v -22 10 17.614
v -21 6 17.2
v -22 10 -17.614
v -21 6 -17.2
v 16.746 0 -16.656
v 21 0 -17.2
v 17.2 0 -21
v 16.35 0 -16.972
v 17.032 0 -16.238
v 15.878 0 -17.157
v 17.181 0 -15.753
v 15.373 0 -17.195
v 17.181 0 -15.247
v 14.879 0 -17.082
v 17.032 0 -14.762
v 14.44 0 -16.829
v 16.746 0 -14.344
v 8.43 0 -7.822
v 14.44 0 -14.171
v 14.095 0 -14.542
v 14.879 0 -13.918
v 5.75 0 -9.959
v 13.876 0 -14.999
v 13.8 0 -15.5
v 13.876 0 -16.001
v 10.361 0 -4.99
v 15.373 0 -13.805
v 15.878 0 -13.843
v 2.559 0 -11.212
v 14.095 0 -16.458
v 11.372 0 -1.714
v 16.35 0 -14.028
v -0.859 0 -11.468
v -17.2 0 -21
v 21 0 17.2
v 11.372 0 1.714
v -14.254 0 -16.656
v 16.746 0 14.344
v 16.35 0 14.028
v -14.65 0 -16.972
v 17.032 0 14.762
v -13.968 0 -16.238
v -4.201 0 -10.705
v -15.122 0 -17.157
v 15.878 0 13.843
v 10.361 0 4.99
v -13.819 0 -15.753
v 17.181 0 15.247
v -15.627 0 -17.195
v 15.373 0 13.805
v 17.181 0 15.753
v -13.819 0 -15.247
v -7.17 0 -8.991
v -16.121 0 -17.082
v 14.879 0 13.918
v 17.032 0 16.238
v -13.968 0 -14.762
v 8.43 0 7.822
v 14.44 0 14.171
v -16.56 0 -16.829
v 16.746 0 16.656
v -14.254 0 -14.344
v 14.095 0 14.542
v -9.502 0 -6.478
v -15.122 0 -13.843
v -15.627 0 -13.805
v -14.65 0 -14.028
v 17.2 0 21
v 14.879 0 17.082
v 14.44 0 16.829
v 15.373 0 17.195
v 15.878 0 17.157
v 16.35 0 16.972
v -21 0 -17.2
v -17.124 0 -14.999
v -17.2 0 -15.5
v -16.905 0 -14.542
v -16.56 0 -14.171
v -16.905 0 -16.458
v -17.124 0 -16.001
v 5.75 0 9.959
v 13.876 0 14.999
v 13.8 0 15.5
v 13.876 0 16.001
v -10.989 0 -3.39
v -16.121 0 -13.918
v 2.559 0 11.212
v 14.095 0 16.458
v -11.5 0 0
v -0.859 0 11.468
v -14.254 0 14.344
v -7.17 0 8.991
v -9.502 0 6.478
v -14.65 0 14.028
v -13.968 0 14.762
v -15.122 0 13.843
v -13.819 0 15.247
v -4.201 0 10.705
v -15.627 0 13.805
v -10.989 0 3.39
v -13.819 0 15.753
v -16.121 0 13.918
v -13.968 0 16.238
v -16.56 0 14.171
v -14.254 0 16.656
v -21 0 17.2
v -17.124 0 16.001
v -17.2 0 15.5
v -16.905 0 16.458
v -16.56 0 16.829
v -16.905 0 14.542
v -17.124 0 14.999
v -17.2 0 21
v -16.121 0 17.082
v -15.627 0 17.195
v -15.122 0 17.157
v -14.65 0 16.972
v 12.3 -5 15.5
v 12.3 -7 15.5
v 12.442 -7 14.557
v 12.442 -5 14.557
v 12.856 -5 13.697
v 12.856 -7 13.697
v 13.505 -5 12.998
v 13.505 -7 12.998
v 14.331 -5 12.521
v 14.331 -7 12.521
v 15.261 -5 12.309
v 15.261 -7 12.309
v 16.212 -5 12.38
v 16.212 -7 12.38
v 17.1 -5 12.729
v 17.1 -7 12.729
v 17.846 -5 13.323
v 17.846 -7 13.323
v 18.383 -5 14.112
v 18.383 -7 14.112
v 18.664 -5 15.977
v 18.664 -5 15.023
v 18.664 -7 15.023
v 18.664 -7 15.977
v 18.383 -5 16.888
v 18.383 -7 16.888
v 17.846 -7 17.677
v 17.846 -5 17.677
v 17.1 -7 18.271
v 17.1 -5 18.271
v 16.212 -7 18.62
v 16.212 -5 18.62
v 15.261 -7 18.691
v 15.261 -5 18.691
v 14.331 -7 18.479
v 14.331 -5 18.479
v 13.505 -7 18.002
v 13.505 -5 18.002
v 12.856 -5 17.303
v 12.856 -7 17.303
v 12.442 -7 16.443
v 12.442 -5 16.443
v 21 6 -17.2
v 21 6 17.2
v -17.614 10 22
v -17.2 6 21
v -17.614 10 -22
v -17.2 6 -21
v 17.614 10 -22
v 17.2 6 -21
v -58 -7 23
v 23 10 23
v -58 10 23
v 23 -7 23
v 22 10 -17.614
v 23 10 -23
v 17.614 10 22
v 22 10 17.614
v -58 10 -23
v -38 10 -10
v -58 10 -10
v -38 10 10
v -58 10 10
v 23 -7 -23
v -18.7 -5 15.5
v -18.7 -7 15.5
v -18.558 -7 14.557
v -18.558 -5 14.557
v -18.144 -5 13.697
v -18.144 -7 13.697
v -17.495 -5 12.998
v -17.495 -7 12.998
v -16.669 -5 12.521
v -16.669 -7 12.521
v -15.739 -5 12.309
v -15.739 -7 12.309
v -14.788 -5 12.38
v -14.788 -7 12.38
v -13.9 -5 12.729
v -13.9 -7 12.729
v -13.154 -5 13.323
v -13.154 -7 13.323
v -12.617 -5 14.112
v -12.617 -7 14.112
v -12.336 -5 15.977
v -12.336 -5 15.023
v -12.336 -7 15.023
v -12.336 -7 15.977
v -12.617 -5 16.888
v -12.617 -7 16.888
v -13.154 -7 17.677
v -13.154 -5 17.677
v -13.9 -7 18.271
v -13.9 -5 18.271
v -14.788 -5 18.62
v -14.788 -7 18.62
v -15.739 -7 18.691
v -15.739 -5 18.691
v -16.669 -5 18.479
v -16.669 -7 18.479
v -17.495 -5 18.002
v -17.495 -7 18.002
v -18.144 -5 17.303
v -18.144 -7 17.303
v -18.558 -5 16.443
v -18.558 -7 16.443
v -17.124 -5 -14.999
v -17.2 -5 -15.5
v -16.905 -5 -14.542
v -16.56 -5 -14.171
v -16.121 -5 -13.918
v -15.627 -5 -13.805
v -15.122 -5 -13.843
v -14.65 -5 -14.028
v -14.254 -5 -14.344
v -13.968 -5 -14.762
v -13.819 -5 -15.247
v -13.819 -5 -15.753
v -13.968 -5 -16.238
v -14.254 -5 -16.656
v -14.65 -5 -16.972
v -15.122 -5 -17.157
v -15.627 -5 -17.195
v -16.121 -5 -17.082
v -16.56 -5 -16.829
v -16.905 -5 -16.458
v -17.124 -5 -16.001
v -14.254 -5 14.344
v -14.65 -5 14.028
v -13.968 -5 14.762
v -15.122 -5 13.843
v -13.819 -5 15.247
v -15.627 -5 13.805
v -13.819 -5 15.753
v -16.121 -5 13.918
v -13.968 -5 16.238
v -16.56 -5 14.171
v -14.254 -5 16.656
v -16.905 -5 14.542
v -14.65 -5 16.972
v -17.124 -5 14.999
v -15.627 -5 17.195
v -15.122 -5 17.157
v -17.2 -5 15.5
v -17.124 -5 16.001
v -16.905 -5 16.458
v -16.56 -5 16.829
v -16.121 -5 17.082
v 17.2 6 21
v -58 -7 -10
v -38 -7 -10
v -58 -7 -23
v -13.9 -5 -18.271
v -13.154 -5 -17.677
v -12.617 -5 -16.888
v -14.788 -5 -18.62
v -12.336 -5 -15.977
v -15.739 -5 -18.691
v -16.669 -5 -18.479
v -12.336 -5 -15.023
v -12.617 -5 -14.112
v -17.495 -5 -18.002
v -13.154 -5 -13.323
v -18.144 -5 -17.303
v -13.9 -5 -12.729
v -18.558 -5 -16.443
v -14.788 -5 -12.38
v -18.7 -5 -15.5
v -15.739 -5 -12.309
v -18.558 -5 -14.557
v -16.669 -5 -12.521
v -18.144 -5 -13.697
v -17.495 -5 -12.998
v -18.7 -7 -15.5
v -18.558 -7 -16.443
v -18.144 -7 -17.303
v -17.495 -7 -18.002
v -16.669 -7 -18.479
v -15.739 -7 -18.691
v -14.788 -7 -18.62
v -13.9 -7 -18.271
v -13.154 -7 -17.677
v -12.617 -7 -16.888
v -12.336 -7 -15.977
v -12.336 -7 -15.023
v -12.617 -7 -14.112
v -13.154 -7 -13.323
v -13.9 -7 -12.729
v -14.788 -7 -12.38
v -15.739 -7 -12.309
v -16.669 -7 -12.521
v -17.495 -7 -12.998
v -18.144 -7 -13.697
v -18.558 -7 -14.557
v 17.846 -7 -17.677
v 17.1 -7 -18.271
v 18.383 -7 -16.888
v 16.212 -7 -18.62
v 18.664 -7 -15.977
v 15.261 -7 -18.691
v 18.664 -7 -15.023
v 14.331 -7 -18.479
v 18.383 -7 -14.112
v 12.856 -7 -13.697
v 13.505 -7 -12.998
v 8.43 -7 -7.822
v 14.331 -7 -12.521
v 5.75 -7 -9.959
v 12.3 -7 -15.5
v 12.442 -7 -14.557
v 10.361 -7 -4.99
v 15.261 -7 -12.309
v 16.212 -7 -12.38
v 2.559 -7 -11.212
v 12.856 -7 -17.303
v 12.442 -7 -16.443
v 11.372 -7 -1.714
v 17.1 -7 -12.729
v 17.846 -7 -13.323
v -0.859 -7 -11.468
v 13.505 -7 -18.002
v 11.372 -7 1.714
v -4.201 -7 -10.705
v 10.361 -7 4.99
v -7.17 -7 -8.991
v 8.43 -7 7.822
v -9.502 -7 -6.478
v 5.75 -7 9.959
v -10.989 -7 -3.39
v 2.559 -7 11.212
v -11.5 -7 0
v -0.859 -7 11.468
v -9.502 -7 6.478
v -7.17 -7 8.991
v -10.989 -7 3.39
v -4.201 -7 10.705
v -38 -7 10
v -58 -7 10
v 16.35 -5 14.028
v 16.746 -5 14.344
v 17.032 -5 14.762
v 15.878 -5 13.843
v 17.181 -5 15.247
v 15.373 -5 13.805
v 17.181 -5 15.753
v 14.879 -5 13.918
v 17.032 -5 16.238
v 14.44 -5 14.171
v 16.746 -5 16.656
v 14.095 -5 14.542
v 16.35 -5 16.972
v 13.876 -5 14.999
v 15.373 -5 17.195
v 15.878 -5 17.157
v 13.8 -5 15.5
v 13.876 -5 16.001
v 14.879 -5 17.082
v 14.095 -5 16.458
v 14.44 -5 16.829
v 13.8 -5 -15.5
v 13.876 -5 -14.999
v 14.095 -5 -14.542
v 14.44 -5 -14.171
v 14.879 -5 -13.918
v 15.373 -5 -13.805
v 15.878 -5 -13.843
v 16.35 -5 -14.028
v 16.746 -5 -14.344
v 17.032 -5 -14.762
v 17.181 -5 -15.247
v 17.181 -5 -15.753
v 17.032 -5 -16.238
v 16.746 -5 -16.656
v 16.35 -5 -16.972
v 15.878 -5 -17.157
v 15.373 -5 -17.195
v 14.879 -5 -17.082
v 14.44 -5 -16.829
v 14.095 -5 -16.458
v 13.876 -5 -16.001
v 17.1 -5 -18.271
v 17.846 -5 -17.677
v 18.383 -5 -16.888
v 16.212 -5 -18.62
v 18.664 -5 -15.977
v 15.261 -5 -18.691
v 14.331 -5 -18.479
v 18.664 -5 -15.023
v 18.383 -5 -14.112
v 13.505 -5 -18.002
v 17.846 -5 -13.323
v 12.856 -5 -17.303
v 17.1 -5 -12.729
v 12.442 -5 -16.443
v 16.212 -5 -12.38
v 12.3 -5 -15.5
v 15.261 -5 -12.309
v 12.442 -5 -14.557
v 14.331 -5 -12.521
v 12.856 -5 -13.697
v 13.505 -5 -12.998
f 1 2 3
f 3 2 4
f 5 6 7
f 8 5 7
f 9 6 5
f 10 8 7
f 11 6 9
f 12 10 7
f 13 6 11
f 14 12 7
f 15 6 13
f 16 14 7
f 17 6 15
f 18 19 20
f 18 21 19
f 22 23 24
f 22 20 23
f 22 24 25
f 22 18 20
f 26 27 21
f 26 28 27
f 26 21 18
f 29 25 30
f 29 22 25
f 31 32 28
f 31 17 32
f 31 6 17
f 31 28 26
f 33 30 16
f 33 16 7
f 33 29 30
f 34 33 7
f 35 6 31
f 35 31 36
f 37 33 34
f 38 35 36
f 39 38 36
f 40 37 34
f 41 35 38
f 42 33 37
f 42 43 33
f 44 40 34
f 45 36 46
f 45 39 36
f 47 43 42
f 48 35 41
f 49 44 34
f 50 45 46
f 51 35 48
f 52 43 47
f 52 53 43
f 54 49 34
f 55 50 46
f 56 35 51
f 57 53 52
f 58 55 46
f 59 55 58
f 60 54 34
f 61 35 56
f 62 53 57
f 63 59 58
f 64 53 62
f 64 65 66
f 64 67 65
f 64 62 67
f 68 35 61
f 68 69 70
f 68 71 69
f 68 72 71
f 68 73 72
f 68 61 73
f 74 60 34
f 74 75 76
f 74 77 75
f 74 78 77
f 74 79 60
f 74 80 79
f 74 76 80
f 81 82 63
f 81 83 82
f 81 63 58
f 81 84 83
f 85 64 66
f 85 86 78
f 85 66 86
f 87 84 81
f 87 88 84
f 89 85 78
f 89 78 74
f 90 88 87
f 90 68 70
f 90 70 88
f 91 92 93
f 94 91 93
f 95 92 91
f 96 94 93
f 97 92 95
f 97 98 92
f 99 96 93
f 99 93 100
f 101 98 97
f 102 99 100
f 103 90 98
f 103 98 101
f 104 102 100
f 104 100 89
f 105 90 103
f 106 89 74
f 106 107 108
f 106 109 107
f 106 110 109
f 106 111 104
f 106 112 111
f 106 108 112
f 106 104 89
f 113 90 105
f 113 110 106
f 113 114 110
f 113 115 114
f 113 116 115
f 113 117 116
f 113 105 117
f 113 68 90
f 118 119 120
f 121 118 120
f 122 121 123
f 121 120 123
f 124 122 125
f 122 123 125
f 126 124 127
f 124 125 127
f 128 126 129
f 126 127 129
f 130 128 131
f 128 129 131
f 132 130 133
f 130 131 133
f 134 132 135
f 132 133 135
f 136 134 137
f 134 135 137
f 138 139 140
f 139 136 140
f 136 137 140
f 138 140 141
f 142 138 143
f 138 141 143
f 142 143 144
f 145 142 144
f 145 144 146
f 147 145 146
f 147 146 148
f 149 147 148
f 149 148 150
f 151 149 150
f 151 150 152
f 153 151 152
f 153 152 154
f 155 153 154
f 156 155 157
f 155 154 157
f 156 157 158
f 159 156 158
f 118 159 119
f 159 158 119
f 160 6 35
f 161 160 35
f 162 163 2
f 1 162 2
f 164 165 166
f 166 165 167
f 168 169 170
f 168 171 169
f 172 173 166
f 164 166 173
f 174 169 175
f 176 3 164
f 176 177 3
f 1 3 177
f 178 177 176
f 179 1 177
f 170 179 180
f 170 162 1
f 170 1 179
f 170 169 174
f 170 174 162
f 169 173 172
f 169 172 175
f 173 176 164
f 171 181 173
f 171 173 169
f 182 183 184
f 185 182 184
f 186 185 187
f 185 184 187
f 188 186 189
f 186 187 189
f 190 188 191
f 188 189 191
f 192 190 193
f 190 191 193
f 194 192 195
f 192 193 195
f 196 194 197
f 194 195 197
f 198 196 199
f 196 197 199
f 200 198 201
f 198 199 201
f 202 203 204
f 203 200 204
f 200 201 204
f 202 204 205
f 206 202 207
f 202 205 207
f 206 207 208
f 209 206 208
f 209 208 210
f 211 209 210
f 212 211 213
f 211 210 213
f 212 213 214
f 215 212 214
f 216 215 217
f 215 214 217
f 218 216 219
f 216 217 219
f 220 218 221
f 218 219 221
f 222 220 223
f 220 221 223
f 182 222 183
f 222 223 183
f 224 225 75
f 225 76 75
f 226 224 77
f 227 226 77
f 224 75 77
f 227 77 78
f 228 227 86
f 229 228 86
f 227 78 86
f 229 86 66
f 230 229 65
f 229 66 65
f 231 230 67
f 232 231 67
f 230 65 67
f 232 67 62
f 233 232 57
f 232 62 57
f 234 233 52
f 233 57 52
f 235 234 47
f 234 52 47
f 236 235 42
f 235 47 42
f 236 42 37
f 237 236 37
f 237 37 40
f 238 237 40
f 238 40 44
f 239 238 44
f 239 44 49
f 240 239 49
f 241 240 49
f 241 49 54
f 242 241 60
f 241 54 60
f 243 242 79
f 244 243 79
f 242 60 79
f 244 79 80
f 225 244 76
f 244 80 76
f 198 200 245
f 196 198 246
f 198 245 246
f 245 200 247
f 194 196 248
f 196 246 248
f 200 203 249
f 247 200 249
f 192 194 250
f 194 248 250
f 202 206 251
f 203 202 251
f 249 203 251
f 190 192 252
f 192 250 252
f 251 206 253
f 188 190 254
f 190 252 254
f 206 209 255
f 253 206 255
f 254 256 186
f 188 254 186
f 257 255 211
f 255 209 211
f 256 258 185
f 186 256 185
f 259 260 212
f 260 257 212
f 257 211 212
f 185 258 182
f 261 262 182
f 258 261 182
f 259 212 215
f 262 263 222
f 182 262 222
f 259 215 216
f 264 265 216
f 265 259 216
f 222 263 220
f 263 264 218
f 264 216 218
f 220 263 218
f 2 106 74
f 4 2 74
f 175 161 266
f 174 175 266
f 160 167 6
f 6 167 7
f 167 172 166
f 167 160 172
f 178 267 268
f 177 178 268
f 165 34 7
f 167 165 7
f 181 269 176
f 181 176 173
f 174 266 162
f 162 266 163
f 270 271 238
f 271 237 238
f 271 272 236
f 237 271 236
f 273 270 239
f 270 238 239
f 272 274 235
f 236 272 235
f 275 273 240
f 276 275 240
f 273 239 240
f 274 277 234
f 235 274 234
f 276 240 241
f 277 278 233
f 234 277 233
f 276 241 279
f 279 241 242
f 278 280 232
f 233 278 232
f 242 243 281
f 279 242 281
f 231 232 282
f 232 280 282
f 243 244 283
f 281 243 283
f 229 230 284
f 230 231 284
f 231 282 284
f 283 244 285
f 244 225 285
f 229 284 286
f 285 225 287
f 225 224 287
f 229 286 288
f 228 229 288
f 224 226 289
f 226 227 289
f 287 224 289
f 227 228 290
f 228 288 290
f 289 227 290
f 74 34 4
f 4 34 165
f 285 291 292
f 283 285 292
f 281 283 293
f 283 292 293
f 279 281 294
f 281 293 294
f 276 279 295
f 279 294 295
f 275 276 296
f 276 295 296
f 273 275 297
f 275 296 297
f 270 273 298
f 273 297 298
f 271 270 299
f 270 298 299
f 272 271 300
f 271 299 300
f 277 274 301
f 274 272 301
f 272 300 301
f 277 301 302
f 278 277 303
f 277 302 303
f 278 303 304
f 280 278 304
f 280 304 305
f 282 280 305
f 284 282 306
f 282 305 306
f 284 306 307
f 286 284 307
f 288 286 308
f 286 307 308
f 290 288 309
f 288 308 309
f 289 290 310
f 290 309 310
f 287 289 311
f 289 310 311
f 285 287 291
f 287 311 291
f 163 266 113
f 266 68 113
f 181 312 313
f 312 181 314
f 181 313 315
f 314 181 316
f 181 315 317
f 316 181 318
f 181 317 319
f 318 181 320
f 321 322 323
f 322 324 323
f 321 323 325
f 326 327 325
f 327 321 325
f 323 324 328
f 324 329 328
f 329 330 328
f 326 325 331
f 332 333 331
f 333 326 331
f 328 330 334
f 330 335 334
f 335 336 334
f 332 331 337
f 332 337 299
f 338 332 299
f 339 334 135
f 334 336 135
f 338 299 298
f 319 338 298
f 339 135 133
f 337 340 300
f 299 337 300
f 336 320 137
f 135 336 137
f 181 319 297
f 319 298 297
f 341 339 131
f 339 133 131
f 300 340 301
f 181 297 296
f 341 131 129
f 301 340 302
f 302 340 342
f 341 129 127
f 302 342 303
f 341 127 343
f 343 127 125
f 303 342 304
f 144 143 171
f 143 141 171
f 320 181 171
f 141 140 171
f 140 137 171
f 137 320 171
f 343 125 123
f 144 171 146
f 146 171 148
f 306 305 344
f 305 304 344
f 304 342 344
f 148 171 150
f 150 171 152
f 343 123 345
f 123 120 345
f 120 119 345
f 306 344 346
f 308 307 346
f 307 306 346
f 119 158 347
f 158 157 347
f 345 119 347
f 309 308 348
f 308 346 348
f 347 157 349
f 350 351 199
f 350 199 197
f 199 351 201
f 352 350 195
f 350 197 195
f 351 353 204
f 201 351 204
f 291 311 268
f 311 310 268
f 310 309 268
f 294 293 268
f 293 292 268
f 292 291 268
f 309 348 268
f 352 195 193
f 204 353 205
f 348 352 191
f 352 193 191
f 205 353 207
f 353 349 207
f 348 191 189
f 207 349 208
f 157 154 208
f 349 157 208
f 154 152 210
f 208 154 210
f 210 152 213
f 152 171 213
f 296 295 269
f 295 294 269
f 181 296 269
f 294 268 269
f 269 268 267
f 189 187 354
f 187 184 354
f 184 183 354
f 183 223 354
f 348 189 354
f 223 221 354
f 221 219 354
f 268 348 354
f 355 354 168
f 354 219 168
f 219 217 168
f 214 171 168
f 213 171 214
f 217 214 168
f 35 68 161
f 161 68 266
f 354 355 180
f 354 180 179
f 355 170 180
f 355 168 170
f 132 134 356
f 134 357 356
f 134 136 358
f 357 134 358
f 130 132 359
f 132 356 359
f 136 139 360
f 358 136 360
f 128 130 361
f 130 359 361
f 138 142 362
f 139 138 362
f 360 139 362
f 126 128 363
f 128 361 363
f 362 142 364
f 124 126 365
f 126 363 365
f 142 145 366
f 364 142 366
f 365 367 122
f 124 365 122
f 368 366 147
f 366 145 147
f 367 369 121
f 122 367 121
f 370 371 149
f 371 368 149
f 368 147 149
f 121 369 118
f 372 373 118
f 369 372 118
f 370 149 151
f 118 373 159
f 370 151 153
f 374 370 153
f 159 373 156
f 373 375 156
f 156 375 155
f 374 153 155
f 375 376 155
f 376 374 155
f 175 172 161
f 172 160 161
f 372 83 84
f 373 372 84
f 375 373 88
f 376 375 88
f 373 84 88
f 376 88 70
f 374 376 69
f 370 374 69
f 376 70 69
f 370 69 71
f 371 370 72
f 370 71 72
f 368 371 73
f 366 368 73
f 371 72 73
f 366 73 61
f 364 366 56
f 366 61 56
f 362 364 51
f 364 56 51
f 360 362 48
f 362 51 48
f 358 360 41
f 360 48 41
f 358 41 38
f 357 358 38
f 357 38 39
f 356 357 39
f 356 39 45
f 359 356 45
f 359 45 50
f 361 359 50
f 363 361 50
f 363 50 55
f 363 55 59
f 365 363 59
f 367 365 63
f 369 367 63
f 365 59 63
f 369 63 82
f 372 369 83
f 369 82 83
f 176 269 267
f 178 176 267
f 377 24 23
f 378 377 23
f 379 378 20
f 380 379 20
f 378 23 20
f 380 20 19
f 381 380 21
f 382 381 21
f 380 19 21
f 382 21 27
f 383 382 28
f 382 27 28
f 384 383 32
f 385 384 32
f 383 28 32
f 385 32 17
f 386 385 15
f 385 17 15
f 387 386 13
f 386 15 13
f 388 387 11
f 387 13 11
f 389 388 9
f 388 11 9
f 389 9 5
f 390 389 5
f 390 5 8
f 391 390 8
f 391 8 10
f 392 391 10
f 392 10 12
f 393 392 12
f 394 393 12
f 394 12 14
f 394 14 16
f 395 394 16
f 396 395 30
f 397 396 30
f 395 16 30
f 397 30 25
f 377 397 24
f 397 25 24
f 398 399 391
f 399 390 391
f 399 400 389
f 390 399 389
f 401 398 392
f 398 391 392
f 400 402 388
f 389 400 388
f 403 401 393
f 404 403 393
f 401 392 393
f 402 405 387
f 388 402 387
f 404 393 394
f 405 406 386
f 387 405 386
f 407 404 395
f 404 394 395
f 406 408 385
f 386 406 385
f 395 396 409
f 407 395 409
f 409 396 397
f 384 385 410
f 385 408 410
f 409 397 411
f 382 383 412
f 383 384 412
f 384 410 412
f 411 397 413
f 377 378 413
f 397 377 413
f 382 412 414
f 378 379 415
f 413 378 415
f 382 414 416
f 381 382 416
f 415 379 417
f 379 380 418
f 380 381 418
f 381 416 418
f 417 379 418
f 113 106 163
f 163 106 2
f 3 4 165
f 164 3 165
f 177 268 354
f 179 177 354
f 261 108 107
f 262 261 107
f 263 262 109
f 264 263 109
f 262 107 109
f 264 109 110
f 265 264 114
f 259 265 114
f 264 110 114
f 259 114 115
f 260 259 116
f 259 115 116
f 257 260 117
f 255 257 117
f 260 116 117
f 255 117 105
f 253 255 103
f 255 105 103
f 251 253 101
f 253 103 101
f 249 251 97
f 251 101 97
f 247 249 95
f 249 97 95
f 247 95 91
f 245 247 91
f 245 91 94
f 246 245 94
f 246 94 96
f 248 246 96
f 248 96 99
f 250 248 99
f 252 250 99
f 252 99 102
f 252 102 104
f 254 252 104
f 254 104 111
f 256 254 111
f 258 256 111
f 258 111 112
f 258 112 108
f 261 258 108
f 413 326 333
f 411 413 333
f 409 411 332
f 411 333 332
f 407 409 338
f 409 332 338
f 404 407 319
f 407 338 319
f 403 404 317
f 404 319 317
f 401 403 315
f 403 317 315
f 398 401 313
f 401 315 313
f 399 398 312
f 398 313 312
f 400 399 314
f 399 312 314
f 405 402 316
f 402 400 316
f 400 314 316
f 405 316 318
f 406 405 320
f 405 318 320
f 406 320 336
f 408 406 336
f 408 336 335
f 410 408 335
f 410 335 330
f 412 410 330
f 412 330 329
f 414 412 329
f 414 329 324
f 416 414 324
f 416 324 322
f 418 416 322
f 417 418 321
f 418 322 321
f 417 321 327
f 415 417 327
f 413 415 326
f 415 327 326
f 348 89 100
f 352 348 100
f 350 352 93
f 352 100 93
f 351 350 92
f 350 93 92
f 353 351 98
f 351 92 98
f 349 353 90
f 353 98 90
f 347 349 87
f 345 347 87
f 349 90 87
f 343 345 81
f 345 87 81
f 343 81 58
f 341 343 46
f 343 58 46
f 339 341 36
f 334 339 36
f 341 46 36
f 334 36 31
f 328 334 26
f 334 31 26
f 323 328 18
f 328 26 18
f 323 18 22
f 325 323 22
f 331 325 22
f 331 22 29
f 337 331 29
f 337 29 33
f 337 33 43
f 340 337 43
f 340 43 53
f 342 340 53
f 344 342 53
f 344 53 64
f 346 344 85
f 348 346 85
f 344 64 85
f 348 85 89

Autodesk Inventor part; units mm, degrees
ref_plane "YZ Plane" through (0, 0, 0) normal (1, 0, 0) x (0, 1, 0)
ref_plane "XZ Plane" through (0, 0, 0) normal (0, 1, 0) x (-1, 0, 0)
ref_plane "XY Plane" through (0, 0, 0) normal (0, 0, 1) x (1, 0, 0)
sketch "Sketch1" plane through (0, 0, 0) normal (0, 1, 0) x (-1, 0, 0)
  line L0 (-21, 21) -> (21, 21)
  line L1 (21, 21) -> (21, -21)
  line L2 (21, -21) -> (-21, -21)
  line L3 (-21, -21) -> (-21, 21)
  line L4 (-21, 21) -> (21, -21) construction
  line L5 (21, 21) -> (-21, -21) construction
  circle A0 centre (15.5, -15.5) radius 1.7
  circle A1 centre (-15.5, -15.5) radius 1.7
  line L6 (15.5, -15.5) -> (-15.5, -15.5) construction
  circle A2 centre (15.5, 15.5) radius 1.7
  line L7 (15.5, 15.5) -> (-15.5, 15.5) construction
  circle A3 centre (-15.5, 15.5) radius 1.7
  line L8 (-23, 23) -> (23, 23)
  line L9 (23, 23) -> (23, -23)
  line L10 (23, -23) -> (-23, -23)
  line L11 (-23, -23) -> (-23, 23)
  circle A4 centre (0, 0) radius 11.5
  line L12 (23, 23) -> (-23, 23)
  circle A5 centre (15.5, 15.5) radius 3.2
  circle A6 centre (-15.5, 15.5) radius 3.2
  circle A7 centre (-15.5, -15.5) radius 3.2
  circle A8 centre (15.5, -15.5) radius 3.2
  line L13 (23, 23) -> (58, 23)
  line L14 (58, 23) -> (58, 10)
  line L15 (58, 10) -> (23, 10)
  line L16 (23, 10) -> (23, 23)
  line L17 (23, -23) -> (58, -23)
  line L18 (58, -23) -> (58, -10)
  line L19 (58, -10) -> (23, -10)
  line L20 (23, -10) -> (23, -23)
  line L21 (38, -10) -> (38, 10)
  dimension "d20" = 31
  dimension "d21" = 42
  dimension "d22" = 42
  dimension "d23" = 3.4
  dimension "d24" = 3.4
  dimension "d25" = 3.4
  dimension "d26" = 31
  dimension "d27" = 3.4
  dimension "d28" = 2
  dimension "d29" = 2
  dimension "d30" = 2
  dimension "d31" = 2
  dimension "d32" = 23
  dimension "d60" = 1.5
  dimension "d61" = 1.5
  dimension "d62" = 1.5
  dimension "d63" = 1.5
  dimension "d74" = 15
  dimension "d75" = 20
  dimension "d76" = 20
extrude "Extrusion1" add sketch "Sketch1" along normal blind 10 contours L8 L9 L10 L11 | L13 L14 L15 L9 | L15 L21 L19 L9 | L9 L19 L18 L17
extrude "Extrusion2" add sketch "Sketch1" against normal blind 7 contours L0 L1 L2 L3 | L8 L9 L10 L11 | L13 L14 L15 L9 | L15 L21 L19 L9 | L9 L19 L18 L17 | A5 | A6 | A7 | A8
chamfer "Chamfer1" distance 3.8 angle 45 4 edges at (-21, 5, 21) (-21, 5, -21) (21, 5, -21) (21, 5, 21)
chamfer "Chamfer2" distance 1 distance2 4 8 edges at (0, 10, -21) (19.1, 10, -19.1) (21, 10, 0) (19.1, 10, 19.1) (0, 10, 21) (-21, 10, 0) (-19.1, 10, -19.1) (-19.1, 10, 19.1) measured on face at (-26.6667, 10, 3.3333)
extrude "Extrusion3" cut sketch "Sketch1" along normal blind 2 from surface at -7 contours A3 | A5 | A6 | A7 | A8
equation "\"d24\" = d23"
equation "\"d25\" = d23"
equation "\"d26\" = d20"
equation "\"d27\" = d23"
equation "\"d29\" = d28"
equation "\"d30\" = d31"
properties part number "Z Stepper Holder"
